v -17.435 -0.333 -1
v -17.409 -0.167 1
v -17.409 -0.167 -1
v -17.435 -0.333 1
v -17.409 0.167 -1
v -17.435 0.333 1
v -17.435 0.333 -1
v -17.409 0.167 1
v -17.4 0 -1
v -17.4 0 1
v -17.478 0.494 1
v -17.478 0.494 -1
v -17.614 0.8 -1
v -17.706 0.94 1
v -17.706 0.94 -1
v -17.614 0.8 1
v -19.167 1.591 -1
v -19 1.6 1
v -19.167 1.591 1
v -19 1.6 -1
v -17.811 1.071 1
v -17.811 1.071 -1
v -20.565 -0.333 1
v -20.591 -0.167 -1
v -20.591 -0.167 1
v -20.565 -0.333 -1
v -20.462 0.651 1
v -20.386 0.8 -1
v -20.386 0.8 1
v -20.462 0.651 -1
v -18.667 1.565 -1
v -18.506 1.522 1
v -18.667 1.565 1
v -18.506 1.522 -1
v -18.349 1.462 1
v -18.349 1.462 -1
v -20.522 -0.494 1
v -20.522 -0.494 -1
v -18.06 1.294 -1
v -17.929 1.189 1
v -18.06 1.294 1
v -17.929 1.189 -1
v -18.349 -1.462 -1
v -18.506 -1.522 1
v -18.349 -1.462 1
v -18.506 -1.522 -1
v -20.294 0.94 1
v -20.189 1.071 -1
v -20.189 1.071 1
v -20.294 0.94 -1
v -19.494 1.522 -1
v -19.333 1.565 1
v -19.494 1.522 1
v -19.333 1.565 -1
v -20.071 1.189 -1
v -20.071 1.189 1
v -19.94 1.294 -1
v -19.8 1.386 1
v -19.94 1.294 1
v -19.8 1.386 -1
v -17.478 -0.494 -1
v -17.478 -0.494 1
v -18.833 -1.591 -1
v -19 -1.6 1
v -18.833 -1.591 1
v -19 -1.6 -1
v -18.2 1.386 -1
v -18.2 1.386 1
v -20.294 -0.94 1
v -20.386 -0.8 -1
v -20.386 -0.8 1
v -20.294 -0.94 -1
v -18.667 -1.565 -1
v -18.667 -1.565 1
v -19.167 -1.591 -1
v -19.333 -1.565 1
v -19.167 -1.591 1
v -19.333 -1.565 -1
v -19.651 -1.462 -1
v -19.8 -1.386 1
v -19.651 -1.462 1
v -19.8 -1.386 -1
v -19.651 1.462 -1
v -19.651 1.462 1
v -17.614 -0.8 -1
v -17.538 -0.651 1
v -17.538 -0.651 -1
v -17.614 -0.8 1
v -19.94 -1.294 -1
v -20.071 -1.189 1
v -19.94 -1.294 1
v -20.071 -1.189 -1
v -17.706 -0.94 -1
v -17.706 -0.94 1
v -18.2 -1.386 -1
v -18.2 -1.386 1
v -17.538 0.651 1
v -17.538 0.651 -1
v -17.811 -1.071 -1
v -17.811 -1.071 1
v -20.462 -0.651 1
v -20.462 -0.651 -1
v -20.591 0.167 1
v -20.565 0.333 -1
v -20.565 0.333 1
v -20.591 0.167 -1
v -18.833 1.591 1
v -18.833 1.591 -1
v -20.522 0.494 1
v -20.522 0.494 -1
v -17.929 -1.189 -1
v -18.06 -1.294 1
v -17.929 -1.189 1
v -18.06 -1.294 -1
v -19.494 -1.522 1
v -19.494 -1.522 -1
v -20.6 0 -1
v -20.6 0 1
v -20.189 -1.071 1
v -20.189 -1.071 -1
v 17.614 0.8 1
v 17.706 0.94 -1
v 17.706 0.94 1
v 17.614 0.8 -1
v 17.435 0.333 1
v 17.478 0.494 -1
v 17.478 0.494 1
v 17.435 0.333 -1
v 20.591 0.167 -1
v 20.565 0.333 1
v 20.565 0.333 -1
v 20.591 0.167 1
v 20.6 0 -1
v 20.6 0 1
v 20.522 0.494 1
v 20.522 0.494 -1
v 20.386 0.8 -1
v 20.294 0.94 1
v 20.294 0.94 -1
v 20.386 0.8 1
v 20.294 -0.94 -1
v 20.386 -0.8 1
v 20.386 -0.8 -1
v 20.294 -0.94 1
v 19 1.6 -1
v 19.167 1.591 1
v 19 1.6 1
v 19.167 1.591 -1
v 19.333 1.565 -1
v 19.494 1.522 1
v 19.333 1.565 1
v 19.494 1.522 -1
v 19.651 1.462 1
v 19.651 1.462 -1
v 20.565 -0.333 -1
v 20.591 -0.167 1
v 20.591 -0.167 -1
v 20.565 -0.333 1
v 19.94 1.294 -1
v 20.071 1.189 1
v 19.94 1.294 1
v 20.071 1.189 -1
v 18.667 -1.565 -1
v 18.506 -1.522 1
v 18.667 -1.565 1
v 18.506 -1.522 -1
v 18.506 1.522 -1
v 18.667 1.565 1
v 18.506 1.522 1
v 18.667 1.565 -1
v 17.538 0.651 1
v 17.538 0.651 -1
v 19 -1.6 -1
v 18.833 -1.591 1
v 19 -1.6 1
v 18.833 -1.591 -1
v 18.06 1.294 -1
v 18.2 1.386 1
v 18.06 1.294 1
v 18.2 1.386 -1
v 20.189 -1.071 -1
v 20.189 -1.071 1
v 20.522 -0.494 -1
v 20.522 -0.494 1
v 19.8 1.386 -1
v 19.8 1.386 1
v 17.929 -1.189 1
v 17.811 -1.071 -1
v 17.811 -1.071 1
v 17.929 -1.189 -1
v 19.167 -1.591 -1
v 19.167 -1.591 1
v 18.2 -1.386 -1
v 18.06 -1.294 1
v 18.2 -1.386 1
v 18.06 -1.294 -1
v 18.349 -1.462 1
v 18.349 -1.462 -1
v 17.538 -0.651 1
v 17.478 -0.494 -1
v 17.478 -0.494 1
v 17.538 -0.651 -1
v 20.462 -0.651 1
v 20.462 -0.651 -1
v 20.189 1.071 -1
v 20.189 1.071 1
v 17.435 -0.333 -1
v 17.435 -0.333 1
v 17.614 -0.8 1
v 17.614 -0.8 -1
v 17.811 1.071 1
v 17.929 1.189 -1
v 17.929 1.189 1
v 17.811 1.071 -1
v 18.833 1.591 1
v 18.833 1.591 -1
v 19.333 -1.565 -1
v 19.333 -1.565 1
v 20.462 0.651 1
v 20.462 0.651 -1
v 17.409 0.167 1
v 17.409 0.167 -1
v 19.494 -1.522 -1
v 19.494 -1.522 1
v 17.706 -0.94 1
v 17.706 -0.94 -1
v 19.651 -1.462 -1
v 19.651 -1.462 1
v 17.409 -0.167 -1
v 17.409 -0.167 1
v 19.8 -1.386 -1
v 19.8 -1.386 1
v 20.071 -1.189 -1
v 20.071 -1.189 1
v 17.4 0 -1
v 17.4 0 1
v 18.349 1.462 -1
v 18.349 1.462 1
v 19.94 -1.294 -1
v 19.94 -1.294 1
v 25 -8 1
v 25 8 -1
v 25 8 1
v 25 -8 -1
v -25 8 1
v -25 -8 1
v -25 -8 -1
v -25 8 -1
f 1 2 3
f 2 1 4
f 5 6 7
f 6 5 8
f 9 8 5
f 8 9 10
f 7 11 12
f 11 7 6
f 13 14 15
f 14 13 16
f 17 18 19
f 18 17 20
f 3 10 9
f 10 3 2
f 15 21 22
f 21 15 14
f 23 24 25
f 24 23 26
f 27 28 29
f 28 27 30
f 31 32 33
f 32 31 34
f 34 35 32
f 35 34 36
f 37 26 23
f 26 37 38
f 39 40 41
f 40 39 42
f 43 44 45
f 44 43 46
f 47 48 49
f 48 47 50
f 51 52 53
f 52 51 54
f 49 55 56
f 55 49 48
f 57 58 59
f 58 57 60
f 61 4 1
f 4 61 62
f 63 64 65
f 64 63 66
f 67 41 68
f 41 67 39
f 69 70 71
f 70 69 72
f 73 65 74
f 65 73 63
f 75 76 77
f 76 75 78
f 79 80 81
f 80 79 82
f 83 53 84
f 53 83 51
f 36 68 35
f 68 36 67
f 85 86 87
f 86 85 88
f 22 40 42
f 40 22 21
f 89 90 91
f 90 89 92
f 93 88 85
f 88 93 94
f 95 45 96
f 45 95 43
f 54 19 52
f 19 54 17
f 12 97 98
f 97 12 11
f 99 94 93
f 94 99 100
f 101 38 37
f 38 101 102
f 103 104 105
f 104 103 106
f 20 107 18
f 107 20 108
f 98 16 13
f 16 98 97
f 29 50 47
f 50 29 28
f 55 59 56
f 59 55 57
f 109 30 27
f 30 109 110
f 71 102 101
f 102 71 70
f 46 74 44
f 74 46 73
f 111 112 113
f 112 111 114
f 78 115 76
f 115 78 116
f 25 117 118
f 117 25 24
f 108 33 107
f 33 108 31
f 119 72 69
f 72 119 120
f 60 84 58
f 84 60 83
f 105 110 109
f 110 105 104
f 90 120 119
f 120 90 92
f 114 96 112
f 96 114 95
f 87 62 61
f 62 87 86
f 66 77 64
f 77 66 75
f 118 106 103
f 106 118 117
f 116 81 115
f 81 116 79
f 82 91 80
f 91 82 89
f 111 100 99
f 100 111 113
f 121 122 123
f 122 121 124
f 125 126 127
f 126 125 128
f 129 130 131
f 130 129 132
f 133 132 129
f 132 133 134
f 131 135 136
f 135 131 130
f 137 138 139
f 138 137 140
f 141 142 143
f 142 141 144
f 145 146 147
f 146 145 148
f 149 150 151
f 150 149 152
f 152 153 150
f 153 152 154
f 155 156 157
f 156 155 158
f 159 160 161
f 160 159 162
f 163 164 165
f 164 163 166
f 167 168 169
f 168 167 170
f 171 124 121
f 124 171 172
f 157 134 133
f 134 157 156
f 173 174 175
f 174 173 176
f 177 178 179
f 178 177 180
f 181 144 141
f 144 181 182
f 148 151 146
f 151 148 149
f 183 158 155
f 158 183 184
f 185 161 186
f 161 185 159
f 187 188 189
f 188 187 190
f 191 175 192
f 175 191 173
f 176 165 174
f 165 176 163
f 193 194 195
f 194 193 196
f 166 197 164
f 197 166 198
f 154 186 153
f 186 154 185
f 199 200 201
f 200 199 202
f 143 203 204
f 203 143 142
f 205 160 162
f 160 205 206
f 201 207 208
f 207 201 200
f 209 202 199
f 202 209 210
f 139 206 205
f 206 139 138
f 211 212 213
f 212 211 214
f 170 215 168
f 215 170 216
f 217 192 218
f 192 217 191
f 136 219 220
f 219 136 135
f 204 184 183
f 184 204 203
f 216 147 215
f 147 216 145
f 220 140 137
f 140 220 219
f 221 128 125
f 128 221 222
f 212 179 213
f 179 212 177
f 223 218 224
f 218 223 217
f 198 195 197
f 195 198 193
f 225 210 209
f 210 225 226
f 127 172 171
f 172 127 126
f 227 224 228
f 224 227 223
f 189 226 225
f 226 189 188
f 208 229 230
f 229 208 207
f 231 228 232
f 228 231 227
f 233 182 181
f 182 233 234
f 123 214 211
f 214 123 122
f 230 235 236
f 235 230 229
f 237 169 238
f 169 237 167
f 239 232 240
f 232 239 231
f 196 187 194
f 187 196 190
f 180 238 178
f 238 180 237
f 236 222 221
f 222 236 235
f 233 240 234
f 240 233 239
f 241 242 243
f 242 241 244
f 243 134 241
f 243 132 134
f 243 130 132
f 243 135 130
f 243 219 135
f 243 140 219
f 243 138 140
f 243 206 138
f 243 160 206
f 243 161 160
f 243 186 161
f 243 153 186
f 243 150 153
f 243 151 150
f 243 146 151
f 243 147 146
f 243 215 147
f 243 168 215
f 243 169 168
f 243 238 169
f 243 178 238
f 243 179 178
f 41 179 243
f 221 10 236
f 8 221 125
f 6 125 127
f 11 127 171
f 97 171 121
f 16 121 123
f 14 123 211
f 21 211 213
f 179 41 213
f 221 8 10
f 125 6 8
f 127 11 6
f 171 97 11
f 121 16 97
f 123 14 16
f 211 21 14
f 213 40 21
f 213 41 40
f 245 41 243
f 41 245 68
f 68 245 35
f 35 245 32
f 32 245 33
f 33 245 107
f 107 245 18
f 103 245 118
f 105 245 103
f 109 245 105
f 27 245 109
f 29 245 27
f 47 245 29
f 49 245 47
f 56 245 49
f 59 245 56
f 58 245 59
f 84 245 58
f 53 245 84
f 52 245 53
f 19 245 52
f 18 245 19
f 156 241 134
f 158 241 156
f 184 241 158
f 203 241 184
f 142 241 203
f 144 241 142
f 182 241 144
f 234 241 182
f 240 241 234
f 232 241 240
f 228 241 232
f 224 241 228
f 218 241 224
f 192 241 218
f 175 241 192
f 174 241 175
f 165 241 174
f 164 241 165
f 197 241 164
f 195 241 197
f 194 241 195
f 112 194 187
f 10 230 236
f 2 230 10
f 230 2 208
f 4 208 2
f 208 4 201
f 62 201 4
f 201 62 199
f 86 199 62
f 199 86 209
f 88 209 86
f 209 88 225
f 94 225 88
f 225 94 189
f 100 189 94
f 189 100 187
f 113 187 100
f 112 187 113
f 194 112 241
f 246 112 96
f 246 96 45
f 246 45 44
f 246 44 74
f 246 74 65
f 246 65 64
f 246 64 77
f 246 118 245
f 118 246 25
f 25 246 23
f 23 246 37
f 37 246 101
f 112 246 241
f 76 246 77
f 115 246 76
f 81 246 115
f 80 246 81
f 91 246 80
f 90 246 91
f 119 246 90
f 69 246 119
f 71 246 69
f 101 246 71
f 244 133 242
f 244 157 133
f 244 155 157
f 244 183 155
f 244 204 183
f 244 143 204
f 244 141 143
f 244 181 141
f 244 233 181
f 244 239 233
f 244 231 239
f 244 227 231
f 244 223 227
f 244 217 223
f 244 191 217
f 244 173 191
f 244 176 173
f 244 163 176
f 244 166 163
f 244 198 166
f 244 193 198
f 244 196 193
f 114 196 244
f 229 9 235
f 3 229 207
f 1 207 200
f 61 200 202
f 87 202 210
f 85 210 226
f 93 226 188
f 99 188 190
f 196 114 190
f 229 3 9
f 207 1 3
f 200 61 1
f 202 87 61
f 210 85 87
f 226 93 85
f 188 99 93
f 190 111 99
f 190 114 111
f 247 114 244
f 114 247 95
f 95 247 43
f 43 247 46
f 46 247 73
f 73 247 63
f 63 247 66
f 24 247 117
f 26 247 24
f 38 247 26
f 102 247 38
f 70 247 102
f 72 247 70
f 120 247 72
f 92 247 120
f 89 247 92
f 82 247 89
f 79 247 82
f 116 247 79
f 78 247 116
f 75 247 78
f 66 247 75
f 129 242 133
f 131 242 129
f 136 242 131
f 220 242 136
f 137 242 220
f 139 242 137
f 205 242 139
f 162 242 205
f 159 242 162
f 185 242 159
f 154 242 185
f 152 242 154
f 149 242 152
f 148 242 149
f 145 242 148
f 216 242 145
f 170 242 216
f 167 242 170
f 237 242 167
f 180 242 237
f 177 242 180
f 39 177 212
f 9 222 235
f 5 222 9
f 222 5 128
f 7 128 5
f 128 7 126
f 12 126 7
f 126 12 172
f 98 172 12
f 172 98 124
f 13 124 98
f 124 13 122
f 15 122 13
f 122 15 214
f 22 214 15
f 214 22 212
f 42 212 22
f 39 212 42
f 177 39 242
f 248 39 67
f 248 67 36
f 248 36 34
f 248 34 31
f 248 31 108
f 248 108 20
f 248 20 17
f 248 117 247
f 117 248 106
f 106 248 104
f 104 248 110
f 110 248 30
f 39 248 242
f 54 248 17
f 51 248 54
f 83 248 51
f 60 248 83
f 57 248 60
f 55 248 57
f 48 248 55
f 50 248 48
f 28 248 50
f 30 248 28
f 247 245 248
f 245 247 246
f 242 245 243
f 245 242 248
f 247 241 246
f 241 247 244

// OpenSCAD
// Engraving-ready nameplate.
$fn = 60;
eps = 0.02;
length = 50;
width = 16;
thickness = 2;
difference() { cube([length,width,thickness],center=true); for(x=[-length/2+6,length/2-6]) translate([x,0,-thickness/2-eps]) cylinder(d=3.2,h=thickness+2*eps); }
